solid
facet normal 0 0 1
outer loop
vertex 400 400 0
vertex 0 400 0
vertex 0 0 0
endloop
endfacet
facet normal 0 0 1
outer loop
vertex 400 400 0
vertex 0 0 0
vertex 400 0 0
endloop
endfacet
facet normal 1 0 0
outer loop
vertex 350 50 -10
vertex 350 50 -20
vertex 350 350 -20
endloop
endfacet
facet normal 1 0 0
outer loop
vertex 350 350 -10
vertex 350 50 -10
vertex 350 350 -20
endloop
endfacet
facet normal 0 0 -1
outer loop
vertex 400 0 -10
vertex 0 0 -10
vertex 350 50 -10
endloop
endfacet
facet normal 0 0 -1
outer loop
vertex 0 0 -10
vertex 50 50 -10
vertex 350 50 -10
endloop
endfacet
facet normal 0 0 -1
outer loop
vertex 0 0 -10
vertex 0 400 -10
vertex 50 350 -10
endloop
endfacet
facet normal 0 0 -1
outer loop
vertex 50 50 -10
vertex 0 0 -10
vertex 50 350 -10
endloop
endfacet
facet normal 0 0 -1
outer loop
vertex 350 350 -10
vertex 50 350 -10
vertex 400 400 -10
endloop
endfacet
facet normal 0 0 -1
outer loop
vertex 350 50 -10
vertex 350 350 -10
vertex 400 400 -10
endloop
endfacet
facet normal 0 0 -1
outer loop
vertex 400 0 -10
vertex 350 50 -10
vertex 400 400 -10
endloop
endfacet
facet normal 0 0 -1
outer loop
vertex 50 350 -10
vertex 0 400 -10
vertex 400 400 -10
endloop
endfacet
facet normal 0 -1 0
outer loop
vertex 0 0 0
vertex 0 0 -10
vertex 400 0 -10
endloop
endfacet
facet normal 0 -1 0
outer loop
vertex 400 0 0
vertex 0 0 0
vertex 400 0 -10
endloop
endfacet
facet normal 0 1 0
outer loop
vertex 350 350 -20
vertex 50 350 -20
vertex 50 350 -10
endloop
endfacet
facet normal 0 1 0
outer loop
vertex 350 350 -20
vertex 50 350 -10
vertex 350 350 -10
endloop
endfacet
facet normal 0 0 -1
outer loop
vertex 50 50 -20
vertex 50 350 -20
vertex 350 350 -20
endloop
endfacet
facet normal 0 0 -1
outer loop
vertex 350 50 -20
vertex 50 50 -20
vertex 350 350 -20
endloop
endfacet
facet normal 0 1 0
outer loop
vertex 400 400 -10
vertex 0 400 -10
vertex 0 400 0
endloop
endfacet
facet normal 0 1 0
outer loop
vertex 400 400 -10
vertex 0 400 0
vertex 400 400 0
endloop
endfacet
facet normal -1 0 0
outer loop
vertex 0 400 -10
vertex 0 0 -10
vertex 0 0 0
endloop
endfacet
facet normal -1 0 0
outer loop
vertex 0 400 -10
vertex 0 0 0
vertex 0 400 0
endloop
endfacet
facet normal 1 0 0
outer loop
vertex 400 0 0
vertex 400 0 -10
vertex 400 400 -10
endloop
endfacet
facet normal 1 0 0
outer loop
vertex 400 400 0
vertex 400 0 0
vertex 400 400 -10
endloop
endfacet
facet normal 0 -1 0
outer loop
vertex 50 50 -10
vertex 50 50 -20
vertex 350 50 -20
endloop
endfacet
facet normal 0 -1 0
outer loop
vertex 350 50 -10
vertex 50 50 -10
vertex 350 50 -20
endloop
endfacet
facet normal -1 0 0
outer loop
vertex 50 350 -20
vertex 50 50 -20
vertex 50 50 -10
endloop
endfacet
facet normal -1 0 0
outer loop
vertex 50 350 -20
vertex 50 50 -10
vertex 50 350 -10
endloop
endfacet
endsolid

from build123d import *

# Parameters (mm, degrees)
BOX004_W     = 300
BOX004_H     = 300
BOX004_DEPTH = 10
BOX003_W     = 400
BOX003_H     = 400
BOX003_DEPTH = 10


with BuildPart() as cube003:
    # Box004 → Box004 (new body)
    with BuildSketch(Plane(origin=(50, 50, -20), x_dir=(1, 0, 0), z_dir=(0, 0, 1))):
        with Locations((150, 150)):
            Rectangle(BOX004_W, BOX004_H)
    extrude(amount=BOX004_DEPTH)


with BuildPart() as w_plate:
    # Box003 → Box003 (new body)
    with BuildSketch(Plane.XY.offset(-10)):
        with Locations((200, 200)):
            Rectangle(BOX003_W, BOX003_H)
    extrude(amount=BOX003_DEPTH)

    # Fusion: union Cube003
    add(cube003.part)


solid = w_plate.part
